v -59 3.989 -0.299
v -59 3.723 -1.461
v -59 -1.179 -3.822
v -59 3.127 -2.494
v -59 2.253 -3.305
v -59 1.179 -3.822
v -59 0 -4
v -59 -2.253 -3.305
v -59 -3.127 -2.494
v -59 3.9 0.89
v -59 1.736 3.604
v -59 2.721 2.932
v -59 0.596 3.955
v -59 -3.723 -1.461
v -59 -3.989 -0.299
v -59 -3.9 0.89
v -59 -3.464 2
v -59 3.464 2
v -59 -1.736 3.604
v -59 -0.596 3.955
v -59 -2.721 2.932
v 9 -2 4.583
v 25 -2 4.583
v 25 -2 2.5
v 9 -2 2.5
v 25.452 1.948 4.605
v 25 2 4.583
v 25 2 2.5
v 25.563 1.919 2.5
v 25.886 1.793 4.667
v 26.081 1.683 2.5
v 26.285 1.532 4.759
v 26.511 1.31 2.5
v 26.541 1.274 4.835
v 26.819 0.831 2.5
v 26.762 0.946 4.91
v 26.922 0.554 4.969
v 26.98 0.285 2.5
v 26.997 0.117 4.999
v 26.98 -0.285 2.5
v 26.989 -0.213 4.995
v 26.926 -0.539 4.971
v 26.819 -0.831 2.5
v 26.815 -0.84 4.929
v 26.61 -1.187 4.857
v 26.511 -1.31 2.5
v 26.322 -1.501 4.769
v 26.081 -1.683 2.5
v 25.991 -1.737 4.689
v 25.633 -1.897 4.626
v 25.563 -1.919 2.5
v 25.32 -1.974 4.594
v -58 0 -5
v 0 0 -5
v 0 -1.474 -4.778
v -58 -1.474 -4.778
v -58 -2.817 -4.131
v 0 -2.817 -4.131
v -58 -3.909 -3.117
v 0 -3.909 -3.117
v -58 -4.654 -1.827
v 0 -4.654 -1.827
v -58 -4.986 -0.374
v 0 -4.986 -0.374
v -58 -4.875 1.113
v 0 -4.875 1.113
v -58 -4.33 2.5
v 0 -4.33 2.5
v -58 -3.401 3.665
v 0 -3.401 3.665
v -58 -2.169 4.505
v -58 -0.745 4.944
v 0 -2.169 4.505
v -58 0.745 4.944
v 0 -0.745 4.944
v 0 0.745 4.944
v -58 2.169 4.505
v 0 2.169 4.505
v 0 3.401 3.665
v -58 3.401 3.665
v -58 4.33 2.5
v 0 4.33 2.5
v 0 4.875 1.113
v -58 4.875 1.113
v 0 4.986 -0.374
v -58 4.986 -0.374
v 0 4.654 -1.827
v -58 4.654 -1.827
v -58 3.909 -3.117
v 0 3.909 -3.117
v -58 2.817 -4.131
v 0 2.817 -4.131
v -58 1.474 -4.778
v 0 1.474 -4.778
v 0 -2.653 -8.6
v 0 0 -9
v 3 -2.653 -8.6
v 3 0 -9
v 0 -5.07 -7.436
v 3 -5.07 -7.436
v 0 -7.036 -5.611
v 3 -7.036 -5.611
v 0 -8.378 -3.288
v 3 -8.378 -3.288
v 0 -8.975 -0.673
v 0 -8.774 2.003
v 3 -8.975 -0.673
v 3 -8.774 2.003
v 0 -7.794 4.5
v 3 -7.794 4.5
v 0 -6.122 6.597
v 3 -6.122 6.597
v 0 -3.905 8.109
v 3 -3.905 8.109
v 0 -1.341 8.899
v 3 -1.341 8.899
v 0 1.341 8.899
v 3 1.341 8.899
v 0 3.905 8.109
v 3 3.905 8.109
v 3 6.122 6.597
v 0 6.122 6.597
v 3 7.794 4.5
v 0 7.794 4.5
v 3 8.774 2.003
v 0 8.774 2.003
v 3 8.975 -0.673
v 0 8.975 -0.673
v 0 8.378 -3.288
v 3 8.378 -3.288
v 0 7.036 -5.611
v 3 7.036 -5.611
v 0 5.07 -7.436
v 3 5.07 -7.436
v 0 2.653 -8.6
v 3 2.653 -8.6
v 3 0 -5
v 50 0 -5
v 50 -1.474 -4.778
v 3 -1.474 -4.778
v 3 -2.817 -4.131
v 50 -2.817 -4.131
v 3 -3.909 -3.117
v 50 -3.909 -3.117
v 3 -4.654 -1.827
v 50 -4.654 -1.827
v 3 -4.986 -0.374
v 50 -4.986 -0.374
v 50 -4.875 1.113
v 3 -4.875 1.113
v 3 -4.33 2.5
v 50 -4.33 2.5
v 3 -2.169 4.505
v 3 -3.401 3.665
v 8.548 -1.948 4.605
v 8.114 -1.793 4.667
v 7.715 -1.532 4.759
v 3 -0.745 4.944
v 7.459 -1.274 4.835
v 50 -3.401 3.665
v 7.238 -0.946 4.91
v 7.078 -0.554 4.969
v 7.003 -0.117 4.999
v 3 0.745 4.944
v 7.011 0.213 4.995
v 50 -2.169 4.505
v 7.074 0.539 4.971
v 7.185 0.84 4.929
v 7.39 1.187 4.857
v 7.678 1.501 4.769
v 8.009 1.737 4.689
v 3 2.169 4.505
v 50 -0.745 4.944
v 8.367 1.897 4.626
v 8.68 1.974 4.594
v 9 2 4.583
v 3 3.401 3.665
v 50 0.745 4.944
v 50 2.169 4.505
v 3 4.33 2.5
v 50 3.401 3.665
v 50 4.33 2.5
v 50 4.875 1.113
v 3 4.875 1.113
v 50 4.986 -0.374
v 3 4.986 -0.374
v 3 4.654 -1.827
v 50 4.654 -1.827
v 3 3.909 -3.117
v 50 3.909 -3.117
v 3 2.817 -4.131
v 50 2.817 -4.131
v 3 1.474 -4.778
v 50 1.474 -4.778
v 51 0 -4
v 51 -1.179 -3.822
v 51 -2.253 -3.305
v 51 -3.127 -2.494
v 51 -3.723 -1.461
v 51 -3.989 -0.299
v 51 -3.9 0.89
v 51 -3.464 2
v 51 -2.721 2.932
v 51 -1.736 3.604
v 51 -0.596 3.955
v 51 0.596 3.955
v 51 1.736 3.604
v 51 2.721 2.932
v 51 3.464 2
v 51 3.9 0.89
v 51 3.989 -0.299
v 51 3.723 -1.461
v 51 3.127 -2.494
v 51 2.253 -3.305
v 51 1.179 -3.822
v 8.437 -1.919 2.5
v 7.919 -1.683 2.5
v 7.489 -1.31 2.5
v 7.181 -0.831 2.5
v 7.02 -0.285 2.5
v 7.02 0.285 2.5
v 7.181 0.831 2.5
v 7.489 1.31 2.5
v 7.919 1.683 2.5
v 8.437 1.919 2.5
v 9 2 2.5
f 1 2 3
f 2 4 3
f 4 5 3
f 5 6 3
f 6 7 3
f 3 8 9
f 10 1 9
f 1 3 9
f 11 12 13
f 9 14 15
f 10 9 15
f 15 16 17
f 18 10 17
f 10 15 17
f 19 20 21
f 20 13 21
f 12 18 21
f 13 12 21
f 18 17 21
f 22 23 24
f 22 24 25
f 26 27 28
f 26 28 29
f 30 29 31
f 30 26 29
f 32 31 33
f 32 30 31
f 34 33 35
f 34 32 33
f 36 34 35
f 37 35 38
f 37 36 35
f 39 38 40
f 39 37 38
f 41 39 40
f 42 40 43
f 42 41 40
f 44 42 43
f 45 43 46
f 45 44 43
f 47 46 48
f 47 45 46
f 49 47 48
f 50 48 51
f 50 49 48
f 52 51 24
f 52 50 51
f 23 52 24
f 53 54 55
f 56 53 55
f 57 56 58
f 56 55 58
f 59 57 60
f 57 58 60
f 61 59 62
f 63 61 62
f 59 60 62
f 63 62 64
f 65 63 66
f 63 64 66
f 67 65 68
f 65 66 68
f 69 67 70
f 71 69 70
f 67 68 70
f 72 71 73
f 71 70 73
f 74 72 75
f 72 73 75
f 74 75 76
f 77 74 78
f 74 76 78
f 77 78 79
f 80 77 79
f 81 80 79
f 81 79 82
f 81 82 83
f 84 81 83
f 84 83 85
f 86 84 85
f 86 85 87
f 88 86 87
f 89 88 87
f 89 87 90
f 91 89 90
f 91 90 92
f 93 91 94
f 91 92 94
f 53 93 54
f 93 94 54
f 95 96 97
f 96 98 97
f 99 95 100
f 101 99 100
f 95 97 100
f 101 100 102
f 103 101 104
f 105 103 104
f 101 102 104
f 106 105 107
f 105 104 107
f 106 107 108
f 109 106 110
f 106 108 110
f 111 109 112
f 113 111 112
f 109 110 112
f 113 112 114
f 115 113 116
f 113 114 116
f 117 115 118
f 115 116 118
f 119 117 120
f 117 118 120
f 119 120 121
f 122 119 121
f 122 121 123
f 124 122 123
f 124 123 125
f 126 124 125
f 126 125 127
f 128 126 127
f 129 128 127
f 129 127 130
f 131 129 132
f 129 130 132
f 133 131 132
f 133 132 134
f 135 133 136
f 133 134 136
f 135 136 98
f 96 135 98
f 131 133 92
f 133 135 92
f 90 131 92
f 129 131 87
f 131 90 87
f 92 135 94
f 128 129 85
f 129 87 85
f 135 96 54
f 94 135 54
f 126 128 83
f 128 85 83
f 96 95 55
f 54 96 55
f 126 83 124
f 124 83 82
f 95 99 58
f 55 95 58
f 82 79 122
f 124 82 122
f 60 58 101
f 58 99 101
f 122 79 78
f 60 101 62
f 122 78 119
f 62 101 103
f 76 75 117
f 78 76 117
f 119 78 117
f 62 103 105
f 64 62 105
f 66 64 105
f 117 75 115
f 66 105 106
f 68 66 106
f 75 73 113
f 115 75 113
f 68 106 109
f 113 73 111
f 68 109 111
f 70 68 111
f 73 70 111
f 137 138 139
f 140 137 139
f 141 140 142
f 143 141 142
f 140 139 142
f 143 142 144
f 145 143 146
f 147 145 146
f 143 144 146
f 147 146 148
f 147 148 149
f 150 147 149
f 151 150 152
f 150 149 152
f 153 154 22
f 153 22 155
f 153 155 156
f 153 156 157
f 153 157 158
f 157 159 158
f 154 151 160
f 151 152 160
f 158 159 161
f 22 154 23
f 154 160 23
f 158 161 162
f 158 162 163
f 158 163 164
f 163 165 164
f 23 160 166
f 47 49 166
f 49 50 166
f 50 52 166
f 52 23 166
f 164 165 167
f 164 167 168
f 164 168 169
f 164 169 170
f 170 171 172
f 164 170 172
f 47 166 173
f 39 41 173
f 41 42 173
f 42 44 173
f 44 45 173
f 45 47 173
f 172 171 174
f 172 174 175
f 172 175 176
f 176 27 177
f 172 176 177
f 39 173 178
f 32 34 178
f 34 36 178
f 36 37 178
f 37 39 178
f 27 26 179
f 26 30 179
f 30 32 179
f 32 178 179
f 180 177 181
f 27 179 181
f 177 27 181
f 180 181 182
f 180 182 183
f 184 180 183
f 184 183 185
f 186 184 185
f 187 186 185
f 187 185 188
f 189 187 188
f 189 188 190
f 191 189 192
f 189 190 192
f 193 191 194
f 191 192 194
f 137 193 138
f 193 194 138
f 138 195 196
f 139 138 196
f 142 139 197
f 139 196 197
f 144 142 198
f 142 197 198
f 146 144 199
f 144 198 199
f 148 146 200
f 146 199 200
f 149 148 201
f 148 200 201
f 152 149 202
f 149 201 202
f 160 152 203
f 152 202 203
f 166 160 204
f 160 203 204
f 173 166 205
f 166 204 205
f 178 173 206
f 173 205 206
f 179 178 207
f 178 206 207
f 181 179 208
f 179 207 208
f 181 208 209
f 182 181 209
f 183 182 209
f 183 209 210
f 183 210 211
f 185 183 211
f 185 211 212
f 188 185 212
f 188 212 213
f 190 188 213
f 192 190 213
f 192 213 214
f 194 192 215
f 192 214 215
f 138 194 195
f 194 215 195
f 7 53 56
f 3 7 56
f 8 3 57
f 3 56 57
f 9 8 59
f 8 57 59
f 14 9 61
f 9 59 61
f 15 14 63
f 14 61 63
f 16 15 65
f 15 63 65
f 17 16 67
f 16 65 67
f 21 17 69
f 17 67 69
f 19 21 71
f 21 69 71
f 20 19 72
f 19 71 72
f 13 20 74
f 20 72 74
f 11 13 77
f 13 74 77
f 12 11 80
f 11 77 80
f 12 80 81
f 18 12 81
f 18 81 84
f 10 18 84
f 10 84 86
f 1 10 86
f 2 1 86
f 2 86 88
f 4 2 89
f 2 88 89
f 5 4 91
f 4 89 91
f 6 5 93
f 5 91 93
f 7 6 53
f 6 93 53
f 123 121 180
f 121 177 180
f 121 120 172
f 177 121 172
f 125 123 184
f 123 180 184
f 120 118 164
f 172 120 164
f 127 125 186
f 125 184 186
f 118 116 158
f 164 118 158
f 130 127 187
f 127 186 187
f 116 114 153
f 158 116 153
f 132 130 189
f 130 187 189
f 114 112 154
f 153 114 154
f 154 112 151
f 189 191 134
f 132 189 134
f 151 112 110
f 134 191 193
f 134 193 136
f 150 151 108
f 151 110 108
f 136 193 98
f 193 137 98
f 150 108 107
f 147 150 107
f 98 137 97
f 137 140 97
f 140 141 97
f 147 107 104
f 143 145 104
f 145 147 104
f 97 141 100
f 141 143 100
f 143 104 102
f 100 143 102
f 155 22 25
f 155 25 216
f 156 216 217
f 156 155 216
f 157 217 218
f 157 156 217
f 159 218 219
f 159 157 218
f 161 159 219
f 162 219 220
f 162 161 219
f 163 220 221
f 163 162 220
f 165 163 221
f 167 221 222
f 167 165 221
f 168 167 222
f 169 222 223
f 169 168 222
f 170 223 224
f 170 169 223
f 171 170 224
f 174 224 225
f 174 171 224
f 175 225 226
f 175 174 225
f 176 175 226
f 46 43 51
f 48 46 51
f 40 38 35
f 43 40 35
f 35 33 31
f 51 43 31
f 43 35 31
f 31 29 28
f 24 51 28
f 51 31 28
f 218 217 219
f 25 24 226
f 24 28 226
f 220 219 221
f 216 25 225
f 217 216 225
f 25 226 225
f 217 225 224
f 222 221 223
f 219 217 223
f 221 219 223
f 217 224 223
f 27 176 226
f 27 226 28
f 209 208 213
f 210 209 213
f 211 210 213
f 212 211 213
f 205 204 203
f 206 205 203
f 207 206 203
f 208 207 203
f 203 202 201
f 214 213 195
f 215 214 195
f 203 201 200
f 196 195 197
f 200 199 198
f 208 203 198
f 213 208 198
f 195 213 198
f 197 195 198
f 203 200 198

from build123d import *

# Parameters (mm, degrees)
CUT_EXTRUDE1_DEPTH = 2.5
CHAMFER1_SIZE      = 1


with BuildPart() as part:
    # Sketch1 → Revolve1 (revolve)
    with BuildSketch(Plane(origin=(0, 0, 0), x_dir=(1, 0, 0), z_dir=(0, 1, 0)), mode=Mode.PRIVATE) as revolve1_sk:
        Polygon((-59, 0), (-59, -5), (0, -5), (0, -9), (3, -9), (3, -5), (51, -5), (51, 0), align=None)
    revolve(revolve1_sk.sketch.rotate(Axis((0, 0, 0), (-1, 0, 0)), 180), axis=Axis((0, 0, 0), (-1, 0, 0)))

    # Sketch2 → Cut-Extrude1 (cut)
    with BuildSketch(Plane.XY.offset(5)):
        with BuildLine():
            Line((9, 2), (25, 2))
            ThreePointArc((25, 2), (27, 0), (25, -2))
            Line((25, -2), (9, -2))
            ThreePointArc((9, -2), (7, 0), (9, 2))
        make_face()
    extrude(amount=-CUT_EXTRUDE1_DEPTH, mode=Mode.SUBTRACT)

    # Chamfer1
    chamfer1_edges = [part.edges().sort_by_distance(p)[0] for p in [
        (51, 0, 5),
        (-59, 0, 5),
    ]]
    chamfer(chamfer1_edges, length=CHAMFER1_SIZE)


solid = part.part
